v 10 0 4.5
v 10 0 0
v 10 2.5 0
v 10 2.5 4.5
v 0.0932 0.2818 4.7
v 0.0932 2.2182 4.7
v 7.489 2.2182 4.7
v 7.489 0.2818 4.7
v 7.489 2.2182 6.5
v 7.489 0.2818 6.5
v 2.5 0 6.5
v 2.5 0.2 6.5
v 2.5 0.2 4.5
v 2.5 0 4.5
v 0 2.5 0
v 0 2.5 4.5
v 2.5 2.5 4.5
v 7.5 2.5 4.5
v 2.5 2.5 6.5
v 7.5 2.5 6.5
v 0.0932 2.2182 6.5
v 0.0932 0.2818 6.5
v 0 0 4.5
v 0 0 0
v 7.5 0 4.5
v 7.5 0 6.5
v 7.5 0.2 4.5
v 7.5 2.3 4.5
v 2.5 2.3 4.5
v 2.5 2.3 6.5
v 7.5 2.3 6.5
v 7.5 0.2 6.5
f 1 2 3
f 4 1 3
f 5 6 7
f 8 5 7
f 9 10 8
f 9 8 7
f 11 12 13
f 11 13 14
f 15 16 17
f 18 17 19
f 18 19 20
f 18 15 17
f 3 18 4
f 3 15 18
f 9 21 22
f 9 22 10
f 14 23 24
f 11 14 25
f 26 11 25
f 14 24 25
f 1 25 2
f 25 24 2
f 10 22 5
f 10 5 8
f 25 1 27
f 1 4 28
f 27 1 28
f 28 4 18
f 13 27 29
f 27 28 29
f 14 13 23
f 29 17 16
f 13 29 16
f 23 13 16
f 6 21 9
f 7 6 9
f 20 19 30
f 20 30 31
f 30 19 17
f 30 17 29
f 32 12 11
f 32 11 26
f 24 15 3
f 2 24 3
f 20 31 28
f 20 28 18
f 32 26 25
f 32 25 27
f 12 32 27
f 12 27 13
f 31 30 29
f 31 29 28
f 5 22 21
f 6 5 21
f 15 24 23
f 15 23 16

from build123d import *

# Parameters (mm, degrees)
ESQUISSE1_W      = 10
ESQUISSE1_H      = 2.5
EXTRUSION1_DEPTH = 6.5
EXTRUSION2_DEPTH = 2
ESQUISSE3_W      = 7.395820239
ESQUISSE3_H      = 1.93647956
EXTRUSION3_DEPTH = 1.8


with BuildPart() as part:
    # Esquisse1 → Extrusion1 (new body)
    with BuildSketch(Plane.XY):
        with Locations((5, 1.25)):
            Rectangle(ESQUISSE1_W, ESQUISSE1_H)
    extrude(amount=EXTRUSION1_DEPTH)

    # Esquisse2 → Extrusion2 (cut)
    with BuildSketch(Plane.XY.offset(6.5)):
        Polygon((2.5, 2.3), (7.5, 2.3), (7.5, 2.5), (10, 2.5), (10, 0), (7.5, 0), (7.5, 0.2), (2.5, 0.2), (2.5, 0), (0, 0), (0, 2.5), (2.5, 2.5), align=None)
    extrude(amount=-EXTRUSION2_DEPTH, mode=Mode.SUBTRACT)


with BuildPart() as body_2:
    # Esquisse3 → Extrusion3 (new body)
    with BuildSketch(Plane.XY.offset(6.5)):
        with Locations((3.791067846, 1.25)):
            Rectangle(ESQUISSE3_W, ESQUISSE3_H)
    extrude(amount=-EXTRUSION3_DEPTH)


solid = Compound([part.part, body_2.part])
